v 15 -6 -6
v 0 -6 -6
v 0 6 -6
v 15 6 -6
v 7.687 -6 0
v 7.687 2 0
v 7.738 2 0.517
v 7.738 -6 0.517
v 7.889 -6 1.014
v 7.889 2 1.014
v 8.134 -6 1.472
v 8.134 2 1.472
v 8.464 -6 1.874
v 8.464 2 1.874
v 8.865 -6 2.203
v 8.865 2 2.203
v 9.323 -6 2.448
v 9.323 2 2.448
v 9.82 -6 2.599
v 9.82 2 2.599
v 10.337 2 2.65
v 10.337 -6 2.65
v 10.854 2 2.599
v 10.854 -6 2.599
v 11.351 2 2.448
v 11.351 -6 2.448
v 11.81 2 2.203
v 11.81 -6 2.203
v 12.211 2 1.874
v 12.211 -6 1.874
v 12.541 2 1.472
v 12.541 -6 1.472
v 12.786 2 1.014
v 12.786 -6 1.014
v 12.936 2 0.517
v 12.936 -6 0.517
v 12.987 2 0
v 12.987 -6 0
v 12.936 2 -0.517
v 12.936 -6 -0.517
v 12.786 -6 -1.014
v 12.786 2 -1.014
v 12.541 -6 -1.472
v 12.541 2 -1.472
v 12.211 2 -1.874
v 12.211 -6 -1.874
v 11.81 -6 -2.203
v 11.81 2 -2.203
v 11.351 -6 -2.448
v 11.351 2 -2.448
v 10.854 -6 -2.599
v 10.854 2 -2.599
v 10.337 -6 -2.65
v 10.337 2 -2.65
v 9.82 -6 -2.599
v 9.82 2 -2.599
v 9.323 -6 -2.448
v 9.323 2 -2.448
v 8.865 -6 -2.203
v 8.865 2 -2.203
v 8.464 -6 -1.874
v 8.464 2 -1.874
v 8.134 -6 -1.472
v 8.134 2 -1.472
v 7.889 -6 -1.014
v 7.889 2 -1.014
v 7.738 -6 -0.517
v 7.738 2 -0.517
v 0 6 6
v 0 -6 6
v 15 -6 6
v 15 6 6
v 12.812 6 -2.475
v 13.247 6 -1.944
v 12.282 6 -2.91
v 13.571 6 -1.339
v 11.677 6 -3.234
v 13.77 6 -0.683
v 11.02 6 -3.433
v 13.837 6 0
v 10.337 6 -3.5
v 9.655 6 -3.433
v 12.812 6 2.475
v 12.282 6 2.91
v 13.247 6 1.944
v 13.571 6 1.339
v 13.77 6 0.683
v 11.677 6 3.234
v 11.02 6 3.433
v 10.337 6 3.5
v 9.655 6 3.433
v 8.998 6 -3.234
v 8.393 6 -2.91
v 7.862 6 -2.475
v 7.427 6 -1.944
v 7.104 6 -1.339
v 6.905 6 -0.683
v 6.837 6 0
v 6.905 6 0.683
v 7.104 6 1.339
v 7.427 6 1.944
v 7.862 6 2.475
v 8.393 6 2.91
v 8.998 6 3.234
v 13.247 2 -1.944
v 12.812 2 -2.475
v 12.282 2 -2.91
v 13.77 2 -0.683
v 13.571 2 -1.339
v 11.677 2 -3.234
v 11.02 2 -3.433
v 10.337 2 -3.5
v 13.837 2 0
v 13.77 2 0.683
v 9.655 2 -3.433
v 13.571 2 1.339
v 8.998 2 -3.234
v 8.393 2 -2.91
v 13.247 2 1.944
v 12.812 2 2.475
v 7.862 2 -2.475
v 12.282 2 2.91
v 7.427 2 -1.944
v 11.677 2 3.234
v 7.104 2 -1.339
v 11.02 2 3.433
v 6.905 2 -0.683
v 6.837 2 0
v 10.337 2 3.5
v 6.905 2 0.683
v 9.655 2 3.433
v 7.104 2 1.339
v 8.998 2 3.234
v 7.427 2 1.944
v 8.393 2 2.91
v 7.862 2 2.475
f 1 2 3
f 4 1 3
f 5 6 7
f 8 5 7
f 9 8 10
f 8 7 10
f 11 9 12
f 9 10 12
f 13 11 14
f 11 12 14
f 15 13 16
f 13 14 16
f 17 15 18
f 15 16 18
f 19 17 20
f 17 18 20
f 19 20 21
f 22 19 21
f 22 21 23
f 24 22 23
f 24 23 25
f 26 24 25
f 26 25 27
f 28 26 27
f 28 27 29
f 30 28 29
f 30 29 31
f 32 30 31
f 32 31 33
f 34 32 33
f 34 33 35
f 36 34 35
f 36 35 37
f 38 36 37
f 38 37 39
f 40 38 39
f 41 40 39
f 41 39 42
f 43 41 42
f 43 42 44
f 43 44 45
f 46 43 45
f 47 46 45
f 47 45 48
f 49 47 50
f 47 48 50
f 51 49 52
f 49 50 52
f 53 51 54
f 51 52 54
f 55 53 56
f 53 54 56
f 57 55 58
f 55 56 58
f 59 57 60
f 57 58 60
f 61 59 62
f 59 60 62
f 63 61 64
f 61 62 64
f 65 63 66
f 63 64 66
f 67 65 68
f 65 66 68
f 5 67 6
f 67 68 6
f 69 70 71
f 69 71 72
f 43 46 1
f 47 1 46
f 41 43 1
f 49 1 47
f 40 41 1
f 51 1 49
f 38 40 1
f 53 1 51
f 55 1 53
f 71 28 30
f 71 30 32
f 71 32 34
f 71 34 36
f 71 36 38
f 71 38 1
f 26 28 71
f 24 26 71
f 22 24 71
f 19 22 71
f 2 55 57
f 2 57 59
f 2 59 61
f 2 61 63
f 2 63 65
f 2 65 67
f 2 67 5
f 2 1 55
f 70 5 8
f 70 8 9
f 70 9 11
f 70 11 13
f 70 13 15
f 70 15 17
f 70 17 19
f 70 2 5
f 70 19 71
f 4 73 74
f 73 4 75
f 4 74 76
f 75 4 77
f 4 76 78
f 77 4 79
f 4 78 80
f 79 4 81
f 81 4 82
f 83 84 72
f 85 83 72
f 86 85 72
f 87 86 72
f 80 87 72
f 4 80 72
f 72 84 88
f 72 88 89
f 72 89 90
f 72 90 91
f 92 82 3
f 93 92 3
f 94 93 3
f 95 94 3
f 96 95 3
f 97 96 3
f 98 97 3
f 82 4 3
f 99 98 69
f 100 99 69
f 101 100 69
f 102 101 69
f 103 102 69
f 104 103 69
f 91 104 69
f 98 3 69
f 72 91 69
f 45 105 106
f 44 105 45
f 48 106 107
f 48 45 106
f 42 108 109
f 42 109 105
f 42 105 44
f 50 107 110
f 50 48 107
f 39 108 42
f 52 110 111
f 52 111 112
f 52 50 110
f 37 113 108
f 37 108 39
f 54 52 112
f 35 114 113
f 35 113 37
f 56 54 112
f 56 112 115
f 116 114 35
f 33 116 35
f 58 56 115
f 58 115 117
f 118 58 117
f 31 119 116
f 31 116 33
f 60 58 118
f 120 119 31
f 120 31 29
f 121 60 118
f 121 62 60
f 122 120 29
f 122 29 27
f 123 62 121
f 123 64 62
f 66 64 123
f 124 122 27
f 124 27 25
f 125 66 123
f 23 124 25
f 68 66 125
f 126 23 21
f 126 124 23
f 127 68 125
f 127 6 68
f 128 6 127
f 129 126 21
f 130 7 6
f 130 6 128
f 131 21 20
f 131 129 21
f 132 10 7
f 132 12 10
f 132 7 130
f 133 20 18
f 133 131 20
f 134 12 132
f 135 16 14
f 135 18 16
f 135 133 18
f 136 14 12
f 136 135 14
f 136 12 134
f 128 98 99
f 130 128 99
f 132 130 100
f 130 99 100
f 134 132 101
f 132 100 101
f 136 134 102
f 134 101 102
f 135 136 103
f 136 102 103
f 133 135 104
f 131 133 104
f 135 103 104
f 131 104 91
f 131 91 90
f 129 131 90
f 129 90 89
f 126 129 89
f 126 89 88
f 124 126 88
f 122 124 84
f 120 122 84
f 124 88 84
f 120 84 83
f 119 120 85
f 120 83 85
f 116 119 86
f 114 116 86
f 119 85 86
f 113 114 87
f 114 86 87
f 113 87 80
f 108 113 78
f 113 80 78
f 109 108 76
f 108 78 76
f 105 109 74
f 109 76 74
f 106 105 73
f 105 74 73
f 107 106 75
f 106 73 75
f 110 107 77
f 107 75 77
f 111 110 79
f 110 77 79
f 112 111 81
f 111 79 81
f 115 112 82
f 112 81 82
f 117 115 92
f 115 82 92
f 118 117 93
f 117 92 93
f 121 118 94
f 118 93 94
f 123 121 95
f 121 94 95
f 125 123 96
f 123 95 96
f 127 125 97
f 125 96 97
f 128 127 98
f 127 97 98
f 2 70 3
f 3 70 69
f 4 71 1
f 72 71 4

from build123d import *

# Parameters (mm, degrees)
F0_W     = 12
F0_H     = 12
F1_DEPTH = 15
F2_R     = 3.5
F3_DEPTH = 4
F4_R     = 2.65
F5_DEPTH = 20


with BuildPart() as f1:
    # F0 (on Right) → F1 (new body)
    with BuildSketch(Plane.YZ):
        Rectangle(F0_W, F0_H)
    extrude(amount=F1_DEPTH)

    # F2 (on face) → F3 (cut)
    with BuildSketch(Plane(origin=(0, 6, 0), x_dir=(-1, 0, 0), z_dir=(0, 1, 0))):
        with Locations((-10.337353, 0)):
            Circle(F2_R)
    extrude(amount=-F3_DEPTH, mode=Mode.SUBTRACT)

    # F4 (on face) → F5 (cut)
    with BuildSketch(Plane(origin=(0, 2, 0), x_dir=(-1, 0, 0), z_dir=(0, 1, 0))):
        with Locations((-10.337353, 0)):
            Circle(F4_R)
    extrude(amount=-F5_DEPTH, mode=Mode.SUBTRACT)


solid = f1.part
